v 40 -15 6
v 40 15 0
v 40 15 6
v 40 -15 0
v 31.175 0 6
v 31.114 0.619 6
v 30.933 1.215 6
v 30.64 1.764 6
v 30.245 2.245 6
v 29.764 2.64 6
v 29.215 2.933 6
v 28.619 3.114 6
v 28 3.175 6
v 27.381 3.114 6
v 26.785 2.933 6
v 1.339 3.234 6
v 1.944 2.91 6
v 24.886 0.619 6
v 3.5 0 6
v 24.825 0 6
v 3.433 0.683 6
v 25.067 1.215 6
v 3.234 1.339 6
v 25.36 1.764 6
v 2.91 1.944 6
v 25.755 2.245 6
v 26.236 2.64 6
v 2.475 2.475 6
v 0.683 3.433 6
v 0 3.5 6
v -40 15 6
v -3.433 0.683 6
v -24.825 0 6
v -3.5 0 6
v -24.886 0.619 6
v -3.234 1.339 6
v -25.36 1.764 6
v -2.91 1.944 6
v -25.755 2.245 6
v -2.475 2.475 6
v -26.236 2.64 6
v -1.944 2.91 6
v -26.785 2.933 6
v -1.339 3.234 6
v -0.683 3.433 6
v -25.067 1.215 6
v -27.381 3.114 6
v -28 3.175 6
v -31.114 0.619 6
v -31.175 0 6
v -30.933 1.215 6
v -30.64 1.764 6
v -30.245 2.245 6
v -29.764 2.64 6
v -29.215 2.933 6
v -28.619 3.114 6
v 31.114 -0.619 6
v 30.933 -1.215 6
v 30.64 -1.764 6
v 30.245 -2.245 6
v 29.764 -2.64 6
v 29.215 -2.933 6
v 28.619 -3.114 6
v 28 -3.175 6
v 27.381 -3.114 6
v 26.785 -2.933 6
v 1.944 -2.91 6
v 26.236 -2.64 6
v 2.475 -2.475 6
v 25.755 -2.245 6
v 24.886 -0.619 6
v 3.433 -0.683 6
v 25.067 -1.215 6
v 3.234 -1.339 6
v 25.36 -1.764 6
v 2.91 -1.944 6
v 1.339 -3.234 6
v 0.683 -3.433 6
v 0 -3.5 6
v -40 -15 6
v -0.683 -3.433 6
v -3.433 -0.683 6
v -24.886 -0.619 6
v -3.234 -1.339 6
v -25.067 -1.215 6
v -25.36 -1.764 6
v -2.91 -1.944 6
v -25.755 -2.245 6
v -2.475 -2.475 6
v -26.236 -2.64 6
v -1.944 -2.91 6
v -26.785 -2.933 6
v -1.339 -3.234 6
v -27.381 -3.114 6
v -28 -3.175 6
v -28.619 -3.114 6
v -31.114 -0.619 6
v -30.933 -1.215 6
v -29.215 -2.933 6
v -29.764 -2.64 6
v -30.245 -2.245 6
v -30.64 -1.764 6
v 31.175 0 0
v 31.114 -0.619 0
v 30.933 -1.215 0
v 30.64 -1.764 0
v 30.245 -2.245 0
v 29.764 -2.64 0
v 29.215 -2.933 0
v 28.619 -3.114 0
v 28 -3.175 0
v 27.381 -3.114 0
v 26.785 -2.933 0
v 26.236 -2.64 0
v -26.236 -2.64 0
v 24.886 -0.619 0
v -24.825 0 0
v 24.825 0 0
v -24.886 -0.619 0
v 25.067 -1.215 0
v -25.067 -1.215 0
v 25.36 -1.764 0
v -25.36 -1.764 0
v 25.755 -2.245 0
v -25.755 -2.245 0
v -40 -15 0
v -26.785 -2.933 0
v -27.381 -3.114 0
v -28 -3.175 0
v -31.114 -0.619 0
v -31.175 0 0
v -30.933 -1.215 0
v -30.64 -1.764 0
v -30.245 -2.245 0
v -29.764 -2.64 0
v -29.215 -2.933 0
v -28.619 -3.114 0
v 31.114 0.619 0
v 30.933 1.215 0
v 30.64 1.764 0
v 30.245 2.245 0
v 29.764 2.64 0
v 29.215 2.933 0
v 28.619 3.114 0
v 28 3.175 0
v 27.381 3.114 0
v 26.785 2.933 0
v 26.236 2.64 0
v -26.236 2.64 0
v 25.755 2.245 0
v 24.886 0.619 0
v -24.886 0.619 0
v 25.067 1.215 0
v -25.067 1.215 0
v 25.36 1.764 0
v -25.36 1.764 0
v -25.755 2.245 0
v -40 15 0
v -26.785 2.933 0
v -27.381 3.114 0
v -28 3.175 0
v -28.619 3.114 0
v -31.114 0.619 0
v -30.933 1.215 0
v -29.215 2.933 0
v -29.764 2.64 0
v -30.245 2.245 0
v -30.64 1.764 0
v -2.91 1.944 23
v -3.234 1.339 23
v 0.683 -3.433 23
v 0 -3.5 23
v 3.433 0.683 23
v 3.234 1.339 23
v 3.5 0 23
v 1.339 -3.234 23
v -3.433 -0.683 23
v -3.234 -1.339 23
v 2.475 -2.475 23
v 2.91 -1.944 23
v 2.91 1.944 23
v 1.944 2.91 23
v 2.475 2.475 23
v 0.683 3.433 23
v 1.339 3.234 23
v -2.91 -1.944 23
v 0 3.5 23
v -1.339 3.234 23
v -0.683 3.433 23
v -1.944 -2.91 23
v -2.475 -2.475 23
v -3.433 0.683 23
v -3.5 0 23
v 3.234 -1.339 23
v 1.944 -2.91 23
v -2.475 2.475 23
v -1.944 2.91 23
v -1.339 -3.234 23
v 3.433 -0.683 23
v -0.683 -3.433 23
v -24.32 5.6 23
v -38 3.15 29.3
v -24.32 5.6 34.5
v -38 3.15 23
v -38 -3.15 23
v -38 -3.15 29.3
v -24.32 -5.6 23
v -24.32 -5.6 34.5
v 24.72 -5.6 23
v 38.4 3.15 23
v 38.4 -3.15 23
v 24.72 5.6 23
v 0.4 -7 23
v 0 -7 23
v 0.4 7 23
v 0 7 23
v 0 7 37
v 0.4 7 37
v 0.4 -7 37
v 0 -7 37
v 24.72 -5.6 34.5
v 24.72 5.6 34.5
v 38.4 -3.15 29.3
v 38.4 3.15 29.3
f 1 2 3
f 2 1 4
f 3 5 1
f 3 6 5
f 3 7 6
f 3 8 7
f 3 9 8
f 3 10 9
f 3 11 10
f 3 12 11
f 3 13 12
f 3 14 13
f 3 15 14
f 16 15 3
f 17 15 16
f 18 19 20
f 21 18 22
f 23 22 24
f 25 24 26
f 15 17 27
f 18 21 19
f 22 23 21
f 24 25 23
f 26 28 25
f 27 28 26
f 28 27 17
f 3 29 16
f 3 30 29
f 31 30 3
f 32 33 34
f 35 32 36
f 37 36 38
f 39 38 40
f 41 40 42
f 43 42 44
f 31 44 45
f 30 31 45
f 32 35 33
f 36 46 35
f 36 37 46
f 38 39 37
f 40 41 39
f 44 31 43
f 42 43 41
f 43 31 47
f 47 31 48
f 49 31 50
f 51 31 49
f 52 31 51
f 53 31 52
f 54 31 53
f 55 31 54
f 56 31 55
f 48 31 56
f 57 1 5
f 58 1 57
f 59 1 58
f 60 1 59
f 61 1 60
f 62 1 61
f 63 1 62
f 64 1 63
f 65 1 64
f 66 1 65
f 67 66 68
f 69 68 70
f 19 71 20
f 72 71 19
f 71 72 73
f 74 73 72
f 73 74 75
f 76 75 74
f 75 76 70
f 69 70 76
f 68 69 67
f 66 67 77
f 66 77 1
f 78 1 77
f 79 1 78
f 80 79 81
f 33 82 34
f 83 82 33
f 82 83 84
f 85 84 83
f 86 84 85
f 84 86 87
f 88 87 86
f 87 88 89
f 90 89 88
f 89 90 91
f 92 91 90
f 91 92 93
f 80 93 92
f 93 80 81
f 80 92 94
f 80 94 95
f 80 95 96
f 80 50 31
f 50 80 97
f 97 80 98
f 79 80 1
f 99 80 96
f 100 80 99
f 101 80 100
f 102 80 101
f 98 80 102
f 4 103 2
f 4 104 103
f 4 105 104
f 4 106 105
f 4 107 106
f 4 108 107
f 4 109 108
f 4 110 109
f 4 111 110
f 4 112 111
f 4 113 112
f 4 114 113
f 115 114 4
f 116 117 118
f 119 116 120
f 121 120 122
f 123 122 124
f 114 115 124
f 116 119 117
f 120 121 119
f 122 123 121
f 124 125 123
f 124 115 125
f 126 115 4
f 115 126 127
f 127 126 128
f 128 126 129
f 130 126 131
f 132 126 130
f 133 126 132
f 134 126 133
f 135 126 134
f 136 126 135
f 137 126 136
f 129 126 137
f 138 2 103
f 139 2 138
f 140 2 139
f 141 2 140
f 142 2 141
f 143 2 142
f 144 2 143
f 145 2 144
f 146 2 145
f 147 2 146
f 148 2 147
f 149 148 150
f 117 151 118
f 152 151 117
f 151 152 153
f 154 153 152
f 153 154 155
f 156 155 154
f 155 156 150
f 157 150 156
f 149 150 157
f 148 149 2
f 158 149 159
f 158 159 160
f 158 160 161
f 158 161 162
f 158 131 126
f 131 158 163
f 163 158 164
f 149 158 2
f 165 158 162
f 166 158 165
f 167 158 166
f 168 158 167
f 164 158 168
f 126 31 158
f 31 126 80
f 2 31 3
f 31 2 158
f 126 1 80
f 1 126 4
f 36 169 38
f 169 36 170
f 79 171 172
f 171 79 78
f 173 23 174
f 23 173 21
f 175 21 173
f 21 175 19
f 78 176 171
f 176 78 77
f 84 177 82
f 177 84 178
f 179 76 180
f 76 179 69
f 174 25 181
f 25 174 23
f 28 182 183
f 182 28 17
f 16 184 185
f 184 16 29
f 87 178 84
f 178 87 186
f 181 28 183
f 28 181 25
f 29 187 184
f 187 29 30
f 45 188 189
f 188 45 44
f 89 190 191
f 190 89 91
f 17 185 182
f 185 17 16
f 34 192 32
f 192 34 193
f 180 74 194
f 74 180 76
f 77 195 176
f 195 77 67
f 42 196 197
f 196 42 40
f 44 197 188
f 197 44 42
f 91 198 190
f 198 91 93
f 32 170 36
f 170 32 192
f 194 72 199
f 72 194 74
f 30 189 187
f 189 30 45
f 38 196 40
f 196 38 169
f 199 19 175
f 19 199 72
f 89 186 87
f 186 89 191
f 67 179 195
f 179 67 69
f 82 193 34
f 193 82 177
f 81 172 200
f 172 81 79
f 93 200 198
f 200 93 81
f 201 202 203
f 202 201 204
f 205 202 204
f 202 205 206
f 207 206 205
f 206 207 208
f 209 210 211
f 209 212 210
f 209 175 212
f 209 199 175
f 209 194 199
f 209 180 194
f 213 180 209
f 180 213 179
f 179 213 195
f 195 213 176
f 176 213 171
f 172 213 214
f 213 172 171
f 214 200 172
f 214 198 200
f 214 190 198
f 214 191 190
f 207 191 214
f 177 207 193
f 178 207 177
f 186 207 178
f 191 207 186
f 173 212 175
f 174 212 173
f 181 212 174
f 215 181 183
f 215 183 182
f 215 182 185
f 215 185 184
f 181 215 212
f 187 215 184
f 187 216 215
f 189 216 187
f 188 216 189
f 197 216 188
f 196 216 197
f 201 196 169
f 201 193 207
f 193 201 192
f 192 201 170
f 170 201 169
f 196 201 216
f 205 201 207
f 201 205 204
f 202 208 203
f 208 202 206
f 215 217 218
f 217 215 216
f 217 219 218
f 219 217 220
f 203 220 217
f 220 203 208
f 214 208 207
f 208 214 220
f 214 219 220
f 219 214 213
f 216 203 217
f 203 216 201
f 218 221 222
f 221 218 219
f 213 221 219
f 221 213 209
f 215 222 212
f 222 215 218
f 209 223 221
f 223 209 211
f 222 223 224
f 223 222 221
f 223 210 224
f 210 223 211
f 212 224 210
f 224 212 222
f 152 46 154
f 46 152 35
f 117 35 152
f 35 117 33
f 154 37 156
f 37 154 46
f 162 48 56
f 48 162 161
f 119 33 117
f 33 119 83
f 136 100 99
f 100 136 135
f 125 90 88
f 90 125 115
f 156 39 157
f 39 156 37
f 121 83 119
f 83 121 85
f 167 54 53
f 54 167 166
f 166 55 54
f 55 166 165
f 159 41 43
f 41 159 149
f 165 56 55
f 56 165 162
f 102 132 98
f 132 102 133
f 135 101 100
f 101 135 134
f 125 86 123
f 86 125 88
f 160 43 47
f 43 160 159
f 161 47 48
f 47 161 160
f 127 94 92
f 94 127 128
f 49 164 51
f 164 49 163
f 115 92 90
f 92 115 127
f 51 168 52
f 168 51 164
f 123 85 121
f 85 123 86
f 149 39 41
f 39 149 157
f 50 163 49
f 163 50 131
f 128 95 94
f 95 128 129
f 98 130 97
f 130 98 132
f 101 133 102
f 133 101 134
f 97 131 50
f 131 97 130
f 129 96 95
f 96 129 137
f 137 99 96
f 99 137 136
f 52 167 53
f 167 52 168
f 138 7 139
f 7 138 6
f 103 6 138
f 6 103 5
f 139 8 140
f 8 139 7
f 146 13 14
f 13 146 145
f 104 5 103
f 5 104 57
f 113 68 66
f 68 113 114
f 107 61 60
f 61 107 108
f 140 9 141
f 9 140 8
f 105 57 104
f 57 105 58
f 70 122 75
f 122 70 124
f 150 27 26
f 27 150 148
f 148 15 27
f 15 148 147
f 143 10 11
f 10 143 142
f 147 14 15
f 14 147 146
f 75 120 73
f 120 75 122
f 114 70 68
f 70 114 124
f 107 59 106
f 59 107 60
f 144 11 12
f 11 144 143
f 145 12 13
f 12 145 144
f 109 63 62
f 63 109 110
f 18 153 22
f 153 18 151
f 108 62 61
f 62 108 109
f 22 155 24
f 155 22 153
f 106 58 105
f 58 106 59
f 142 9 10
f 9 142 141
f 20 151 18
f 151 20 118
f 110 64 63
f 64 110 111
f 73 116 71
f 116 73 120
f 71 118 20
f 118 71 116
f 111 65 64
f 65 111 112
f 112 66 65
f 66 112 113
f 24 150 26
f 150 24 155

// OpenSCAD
$fn = 32;

// ----------------------------------------------------------------------
// Boat cleat: 80 mm base, horn 30 mm up
// ----------------------------------------------------------------------

// --- parameters (mm) ---
base_l = 80;              // base length
base_w = 30;              // base width
base_t = 6;               // base thickness
horn_len = 76;            // horn length
horn_d = 14;              // horn diameter at the middle
horn_z = 30;              // horn axis height
end_drop = 10;            // how far the horn tips drop
post_d = 7;               // centre post diameter
holes_d = 6.35;           // fixing holes
hole_x = 28;              // fixing hole spacing

difference() {
  union() {
    translate([-40, -15, 0]) cube([base_l, base_w, base_t]);
    /* centre post, sunk 1 mm into the base */
    translate([0, 0, 5]) cylinder(h = 25, d = post_d);
    /* horn: a hull chain of boxes, full in the middle and lighter at the tips */
    hull() {
      translate([-38, -3.15, 23]) cube([0.4, 6.3, 6.3], center = false);
      translate([-24.32, -5.6, 23]) cube([0.4, 11.2, 11.5], center = false);
    }
    hull() {
      translate([-24.32, -5.6, 23]) cube([0.4, 11.2, 11.5], center = false);
      translate([0, -7, 23]) cube([0.4, 14, 14], center = false);
    }
    hull() {
      translate([0, -7, 23]) cube([0.4, 14, 14], center = false);
      translate([24.32, -5.6, 23]) cube([0.4, 11.2, 11.5], center = false);
    }
    hull() {
      translate([24.32, -5.6, 23]) cube([0.4, 11.2, 11.5], center = false);
      translate([38, -3.15, 23]) cube([0.4, 6.3, 6.3], center = false);
    }
  }
  translate([-28, 0, -2.5]) cylinder(h = base_t + 5, d = holes_d);
  translate([28, 0, -2.5]) cylinder(h = base_t + 5, d = holes_d);
}
